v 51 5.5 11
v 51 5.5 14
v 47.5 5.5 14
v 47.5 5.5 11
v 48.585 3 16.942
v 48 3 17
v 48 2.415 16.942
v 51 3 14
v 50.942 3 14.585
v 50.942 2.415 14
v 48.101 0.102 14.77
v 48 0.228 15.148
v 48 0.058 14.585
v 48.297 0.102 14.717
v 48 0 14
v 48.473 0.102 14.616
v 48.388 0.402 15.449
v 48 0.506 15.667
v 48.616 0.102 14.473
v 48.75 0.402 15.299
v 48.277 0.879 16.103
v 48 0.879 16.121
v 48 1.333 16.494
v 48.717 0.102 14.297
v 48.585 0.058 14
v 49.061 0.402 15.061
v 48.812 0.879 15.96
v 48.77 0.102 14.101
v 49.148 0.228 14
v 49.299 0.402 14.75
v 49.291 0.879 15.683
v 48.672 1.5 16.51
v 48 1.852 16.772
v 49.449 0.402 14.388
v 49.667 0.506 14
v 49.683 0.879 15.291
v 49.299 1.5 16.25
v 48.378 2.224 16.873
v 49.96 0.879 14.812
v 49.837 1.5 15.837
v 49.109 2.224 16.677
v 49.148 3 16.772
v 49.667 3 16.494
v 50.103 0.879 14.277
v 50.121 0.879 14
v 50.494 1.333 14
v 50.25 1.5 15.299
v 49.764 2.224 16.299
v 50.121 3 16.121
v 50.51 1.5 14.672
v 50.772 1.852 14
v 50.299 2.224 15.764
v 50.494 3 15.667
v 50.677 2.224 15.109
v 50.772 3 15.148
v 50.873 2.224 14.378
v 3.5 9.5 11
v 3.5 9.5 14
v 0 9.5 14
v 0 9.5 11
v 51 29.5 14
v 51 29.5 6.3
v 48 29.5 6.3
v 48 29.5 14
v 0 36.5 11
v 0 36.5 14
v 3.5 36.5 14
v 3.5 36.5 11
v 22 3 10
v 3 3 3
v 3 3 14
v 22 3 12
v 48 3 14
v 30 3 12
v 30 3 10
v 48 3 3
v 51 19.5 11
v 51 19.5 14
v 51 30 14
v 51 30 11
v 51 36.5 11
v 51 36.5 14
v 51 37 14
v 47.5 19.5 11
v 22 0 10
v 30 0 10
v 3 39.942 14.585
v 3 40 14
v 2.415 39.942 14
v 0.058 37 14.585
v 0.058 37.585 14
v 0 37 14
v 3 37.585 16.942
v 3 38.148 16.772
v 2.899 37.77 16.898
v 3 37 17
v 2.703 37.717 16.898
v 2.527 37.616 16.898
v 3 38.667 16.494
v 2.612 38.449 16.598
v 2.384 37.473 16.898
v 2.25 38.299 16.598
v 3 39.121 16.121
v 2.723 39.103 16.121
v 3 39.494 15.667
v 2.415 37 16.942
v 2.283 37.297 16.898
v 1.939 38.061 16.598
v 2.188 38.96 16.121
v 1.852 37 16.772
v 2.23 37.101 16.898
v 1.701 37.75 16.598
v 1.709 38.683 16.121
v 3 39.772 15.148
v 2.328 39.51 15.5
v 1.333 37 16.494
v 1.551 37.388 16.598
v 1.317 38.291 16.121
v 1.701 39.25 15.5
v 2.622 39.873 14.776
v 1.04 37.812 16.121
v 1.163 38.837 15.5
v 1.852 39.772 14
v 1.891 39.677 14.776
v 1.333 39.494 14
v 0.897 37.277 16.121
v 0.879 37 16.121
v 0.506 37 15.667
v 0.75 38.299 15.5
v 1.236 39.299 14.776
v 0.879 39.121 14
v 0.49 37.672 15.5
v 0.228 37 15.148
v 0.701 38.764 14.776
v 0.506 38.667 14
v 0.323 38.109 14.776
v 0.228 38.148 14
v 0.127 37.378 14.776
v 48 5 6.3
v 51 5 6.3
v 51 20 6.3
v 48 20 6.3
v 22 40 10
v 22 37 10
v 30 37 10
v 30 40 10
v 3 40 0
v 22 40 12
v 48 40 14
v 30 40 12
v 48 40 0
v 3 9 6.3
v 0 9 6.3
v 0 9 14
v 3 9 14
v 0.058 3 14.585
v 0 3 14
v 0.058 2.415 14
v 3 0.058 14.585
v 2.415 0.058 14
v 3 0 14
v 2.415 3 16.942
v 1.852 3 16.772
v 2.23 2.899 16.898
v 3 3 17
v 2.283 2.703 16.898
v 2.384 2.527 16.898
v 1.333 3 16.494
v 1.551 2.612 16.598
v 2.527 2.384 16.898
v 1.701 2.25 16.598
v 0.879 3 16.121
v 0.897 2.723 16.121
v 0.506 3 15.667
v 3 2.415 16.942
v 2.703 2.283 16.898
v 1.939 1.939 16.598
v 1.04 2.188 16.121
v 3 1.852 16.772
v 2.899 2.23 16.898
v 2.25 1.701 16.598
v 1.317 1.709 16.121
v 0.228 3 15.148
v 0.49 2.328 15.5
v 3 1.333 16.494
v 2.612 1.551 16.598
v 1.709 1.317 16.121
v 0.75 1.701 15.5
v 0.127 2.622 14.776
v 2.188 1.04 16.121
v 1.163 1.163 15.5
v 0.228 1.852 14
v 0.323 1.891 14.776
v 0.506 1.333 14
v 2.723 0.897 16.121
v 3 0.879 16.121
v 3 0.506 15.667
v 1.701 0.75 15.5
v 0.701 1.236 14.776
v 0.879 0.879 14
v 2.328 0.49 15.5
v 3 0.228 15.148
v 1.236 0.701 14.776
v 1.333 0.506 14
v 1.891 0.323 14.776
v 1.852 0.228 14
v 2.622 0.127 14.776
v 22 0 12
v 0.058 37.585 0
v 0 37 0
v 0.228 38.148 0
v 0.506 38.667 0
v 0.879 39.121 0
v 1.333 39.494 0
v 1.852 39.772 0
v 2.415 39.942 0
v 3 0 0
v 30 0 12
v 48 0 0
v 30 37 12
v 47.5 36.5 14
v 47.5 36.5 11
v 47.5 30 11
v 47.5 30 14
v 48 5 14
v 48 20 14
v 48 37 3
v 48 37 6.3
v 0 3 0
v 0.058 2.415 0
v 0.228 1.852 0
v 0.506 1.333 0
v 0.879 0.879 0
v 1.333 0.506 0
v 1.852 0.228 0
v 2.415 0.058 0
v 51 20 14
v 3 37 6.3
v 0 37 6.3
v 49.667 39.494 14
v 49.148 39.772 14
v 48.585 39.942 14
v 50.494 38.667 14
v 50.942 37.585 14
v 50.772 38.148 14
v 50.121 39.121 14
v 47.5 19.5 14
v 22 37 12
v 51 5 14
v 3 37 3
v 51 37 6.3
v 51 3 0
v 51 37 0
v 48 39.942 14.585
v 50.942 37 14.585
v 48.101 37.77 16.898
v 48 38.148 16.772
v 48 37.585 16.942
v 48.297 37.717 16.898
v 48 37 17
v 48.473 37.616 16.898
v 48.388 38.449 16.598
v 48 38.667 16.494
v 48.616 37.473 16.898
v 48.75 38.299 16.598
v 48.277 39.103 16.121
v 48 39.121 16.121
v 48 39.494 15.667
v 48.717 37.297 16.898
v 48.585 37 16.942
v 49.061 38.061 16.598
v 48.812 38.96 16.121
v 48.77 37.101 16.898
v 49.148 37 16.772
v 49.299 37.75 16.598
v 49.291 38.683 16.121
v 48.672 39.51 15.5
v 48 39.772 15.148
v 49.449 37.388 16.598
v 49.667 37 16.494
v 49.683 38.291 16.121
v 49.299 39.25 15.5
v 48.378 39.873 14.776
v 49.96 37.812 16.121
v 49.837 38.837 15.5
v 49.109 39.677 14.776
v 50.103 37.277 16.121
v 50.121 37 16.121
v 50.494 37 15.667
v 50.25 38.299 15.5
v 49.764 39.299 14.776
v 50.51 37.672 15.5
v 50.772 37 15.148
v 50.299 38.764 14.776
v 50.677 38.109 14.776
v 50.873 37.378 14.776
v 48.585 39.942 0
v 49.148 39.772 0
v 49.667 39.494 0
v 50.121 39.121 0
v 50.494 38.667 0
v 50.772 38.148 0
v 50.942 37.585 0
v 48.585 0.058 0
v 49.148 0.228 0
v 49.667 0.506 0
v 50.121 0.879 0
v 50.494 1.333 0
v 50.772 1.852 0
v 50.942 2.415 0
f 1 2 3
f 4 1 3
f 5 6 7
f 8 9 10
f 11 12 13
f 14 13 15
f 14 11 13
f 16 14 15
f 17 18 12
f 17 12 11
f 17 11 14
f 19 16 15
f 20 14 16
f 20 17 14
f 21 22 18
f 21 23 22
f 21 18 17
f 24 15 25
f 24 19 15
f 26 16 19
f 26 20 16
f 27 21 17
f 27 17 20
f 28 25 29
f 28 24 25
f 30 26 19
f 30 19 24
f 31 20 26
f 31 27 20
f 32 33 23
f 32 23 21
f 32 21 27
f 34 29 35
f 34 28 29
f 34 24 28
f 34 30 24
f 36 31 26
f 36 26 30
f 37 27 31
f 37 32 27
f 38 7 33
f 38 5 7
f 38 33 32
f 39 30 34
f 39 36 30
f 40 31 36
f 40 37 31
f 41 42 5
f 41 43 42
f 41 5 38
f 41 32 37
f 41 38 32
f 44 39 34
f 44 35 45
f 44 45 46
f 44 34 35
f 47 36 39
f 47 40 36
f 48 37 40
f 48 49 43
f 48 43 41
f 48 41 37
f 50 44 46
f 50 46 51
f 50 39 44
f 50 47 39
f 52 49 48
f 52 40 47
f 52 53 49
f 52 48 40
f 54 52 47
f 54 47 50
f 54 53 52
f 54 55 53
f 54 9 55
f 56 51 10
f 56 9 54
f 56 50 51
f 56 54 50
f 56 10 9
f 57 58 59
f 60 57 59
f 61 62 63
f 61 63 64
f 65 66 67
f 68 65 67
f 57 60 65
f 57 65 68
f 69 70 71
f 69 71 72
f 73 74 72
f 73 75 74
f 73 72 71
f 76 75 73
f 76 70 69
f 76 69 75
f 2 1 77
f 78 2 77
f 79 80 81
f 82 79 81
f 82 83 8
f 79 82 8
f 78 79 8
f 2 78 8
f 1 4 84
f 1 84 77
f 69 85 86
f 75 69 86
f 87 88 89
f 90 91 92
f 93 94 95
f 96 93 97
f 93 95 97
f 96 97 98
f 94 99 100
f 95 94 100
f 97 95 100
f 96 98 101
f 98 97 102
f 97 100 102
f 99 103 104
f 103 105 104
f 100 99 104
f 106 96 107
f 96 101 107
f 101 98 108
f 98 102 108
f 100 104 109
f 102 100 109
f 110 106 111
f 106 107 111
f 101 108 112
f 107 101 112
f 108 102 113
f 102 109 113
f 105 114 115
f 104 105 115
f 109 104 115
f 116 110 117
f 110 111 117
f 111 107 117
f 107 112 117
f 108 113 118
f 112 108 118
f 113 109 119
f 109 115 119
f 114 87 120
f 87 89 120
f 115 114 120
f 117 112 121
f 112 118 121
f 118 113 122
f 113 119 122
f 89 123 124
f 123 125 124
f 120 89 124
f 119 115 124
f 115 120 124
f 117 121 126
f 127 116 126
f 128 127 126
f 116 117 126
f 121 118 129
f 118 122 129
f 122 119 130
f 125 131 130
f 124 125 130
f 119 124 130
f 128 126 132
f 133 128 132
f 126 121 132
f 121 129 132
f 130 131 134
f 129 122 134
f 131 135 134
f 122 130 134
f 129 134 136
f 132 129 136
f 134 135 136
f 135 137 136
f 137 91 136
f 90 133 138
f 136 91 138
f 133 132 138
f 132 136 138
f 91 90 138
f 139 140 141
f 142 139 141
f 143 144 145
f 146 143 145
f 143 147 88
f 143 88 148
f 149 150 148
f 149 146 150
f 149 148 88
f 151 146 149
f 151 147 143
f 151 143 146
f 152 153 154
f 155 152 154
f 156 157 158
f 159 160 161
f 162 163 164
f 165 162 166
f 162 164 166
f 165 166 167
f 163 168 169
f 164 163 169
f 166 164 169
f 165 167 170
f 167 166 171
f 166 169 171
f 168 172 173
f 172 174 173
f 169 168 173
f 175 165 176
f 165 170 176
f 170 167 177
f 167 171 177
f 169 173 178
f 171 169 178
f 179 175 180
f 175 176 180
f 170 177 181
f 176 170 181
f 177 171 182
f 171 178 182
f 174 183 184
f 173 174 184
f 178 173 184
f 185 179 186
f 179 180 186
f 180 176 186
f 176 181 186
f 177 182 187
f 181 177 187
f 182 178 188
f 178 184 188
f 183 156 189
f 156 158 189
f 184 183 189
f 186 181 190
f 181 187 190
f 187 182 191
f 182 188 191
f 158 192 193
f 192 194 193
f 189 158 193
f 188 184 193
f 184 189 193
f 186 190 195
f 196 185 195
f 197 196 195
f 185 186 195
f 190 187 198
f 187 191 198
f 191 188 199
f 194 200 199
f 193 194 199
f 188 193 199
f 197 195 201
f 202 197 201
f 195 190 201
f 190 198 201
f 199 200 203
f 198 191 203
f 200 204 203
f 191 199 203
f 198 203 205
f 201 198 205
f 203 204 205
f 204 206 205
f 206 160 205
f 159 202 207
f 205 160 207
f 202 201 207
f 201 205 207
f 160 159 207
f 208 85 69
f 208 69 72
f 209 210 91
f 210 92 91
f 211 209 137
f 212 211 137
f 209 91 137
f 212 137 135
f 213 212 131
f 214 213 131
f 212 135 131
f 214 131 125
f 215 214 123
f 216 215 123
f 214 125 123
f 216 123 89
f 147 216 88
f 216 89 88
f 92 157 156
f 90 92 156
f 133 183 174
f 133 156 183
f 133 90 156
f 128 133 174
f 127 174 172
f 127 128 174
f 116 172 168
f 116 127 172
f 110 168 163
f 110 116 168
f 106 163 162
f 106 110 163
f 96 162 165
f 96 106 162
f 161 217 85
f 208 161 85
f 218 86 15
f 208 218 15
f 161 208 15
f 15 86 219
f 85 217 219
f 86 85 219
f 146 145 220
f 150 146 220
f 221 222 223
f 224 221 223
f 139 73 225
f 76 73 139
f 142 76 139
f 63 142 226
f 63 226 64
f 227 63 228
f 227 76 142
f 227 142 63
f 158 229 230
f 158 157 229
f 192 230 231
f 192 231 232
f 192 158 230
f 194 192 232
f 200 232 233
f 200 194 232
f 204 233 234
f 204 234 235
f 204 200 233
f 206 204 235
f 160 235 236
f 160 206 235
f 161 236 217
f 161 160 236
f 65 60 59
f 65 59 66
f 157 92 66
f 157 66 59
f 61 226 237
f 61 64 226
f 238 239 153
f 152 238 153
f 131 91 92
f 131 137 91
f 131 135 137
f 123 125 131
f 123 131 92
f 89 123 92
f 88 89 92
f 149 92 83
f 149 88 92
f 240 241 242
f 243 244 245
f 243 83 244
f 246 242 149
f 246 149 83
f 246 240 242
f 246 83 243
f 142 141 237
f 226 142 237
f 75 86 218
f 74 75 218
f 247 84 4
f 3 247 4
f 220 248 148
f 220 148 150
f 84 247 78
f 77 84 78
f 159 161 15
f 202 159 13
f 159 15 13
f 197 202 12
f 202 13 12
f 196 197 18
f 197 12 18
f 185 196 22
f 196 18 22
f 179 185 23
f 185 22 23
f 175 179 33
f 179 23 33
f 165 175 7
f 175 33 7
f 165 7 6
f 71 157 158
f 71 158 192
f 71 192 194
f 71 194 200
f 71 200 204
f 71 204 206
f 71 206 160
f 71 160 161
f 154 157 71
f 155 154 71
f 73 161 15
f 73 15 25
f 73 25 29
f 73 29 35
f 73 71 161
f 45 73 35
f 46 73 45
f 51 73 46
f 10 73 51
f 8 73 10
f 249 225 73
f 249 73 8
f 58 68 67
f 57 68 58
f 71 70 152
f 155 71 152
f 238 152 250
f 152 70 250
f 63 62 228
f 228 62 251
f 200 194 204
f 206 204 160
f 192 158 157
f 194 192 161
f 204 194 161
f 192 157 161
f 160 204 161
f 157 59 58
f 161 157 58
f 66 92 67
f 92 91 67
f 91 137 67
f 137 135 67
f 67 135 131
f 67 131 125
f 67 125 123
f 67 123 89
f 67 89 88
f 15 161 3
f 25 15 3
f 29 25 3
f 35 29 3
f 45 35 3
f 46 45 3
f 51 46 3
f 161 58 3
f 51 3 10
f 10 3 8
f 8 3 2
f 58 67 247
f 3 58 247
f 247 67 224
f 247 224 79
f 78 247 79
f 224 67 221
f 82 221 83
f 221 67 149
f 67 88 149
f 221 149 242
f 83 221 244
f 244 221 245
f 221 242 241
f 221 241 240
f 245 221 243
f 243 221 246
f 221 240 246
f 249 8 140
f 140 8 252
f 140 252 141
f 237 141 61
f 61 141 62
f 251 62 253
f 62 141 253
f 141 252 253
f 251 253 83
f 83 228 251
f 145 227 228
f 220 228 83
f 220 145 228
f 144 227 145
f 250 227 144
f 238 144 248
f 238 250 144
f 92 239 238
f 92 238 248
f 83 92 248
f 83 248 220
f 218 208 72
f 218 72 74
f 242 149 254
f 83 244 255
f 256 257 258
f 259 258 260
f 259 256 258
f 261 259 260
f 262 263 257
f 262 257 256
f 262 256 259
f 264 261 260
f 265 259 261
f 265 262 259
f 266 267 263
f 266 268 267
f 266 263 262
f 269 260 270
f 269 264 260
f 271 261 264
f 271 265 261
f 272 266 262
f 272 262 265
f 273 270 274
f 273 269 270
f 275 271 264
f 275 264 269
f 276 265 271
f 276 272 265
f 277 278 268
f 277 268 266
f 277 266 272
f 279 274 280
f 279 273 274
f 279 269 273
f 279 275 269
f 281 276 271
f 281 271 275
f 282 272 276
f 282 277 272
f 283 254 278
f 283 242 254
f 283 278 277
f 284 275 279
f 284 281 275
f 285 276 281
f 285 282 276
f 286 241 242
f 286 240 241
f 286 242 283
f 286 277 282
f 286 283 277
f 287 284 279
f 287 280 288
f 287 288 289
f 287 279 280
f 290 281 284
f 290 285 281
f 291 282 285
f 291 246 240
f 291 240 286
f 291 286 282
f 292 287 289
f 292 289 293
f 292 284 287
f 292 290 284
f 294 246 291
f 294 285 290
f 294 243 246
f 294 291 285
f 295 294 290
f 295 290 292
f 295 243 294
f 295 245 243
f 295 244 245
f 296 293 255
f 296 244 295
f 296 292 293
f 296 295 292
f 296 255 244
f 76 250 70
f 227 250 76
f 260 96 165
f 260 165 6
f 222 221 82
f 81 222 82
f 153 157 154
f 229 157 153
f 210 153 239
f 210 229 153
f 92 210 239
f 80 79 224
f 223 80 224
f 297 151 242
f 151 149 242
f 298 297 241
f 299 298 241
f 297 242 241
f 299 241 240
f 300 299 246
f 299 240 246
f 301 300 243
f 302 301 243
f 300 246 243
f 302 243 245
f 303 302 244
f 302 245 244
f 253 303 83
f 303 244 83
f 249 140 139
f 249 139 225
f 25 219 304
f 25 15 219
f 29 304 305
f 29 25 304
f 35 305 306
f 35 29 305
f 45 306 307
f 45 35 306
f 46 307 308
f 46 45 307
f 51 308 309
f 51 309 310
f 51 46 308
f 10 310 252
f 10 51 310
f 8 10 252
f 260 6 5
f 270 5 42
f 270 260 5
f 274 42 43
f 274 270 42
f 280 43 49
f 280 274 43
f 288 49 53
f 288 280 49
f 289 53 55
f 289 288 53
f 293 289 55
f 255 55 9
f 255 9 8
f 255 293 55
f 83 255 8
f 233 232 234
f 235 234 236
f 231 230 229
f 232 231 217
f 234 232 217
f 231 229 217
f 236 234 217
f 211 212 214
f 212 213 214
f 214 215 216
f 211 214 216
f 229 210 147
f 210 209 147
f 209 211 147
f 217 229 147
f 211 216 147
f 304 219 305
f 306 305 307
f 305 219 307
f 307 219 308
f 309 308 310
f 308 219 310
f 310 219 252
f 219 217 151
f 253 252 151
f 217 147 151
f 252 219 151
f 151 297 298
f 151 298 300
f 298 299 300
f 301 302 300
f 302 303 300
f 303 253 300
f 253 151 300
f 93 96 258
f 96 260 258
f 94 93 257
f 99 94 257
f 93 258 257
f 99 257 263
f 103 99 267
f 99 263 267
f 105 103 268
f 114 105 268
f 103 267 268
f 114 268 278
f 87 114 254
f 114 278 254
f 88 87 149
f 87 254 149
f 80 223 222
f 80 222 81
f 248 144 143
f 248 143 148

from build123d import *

# Parameters (mm, degrees)
F0_W      = 51
F0_H      = 40
F1_DEPTH  = 14
F2_T      = -3
F3_W      = 7.5
F3_H      = 7.7
F3_W_2    = 15
F4_DEPTH  = 25
F5_W      = 28
F5_H      = 7.7
F6_DEPTH  = 25
F7_W      = 8
F7_H      = 2
F8_DEPTH  = 40.001
F9_R      = 2.99999
F10_W     = 51
F10_H     = 40
F11_DEPTH = 3
F13_DEPTH = 3
F14_W     = 44
F14_H     = 33
F15_DEPTH = 3
F16_R     = 2.99999


# Not quite as in the source:
# - a fillet or chamfer is up to 0.001 mm smaller than in the source, because OpenCascade refuses the exact size


with BuildPart() as f1:
    # F0 (on Top) → F1 (new body)
    with BuildSketch(Plane.XY):
        with Locations((25.5, 20)):
            Rectangle(F0_W, F0_H)
    extrude(amount=F1_DEPTH)

    # F2
    f2_openings = [f1.faces().sort_by_distance(p)[0] for p in [
        (25.5, 20, 14),
    ]]
    offset(amount=F2_T, openings=f2_openings)

    # F3 (on face) → F4 (cut)
    with BuildSketch(Plane.YZ.offset(51)):
        with Locations((33.25, 10.15)):
            Rectangle(F3_W, F3_H)
        with Locations((12.5, 10.15)):
            Rectangle(F3_W_2, F3_H)
    extrude(amount=-F4_DEPTH, mode=Mode.SUBTRACT)

    # F5 (on face) → F6 (cut)
    with BuildSketch(Plane(origin=(0, 0, 0), x_dir=(0, -1, 0), z_dir=(-1, 0, 0))):
        with Locations((-23, 10.15)):
            Rectangle(F5_W, F5_H)
    extrude(amount=-F6_DEPTH, mode=Mode.SUBTRACT)

    # F7 (on face) → F8 (cut, through all)
    with BuildSketch(Plane.XZ):
        with Locations((26, 11)):
            Rectangle(F7_W, F7_H)
    extrude(amount=-F8_DEPTH, mode=Mode.SUBTRACT)

    # F9 (radius 3 in the source; OpenCascade refuses exactly that, so slightly less here)
    f9_edges = [f1.edges().sort_by_distance(p)[0] for p in [
        (0, 0, 7),
        (51, 0, 7),
        (51, 40, 7),
        (0, 40, 7),
    ]]
    fillet(f9_edges, radius=F9_R)


with BuildPart() as f11:
    # F10 (on face) → F11 (new body)
    with BuildSketch(Plane.XY.offset(14)):
        with Locations((25.5, 20)):
            Rectangle(F10_W, F10_H)
    extrude(amount=F11_DEPTH)

    # F12 (on face) → F13 (join)
    with BuildSketch(Plane(origin=(0, 0, 14), x_dir=(1, 0, 0), z_dir=(0, 0, -1))):
        Polygon((0, -36.5), (3.5, -36.5), (47.5, -36.5), (51, -36.5), (51, -30), (47.5, -30), (47.5, -19.5), (51, -19.5), (51, -5.5), (47.5, -5.5), (47.5, -3.5), (3.5, -3.5), (3.5, -9.5), (0, -9.5), align=None)
    extrude(amount=F13_DEPTH)

    # F14 (on face) → F15 (cut)
    with BuildSketch(Plane(origin=(0, 0, 11), x_dir=(1, 0, 0), z_dir=(0, 0, -1))):
        with Locations((25.5, -20)):
            Rectangle(F14_W, F14_H)
    extrude(amount=-F15_DEPTH, mode=Mode.SUBTRACT)

    # F16 (radius 3 in the source; OpenCascade refuses exactly that, so slightly less here)
    f16_edges = [f11.edges().sort_by_distance(p)[0] for p in [
        (0, 40, 15.5),
        (51, 40, 15.5),
        (25.5, 40, 17),
        (51, 20, 17),
        (0, 0, 15.5),
        (0, 20, 17),
        (25.5, 0, 17),
        (51, 0, 15.5),
    ]]
    fillet(f16_edges, radius=F16_R)


solid = Compound([f1.part, f11.part])
